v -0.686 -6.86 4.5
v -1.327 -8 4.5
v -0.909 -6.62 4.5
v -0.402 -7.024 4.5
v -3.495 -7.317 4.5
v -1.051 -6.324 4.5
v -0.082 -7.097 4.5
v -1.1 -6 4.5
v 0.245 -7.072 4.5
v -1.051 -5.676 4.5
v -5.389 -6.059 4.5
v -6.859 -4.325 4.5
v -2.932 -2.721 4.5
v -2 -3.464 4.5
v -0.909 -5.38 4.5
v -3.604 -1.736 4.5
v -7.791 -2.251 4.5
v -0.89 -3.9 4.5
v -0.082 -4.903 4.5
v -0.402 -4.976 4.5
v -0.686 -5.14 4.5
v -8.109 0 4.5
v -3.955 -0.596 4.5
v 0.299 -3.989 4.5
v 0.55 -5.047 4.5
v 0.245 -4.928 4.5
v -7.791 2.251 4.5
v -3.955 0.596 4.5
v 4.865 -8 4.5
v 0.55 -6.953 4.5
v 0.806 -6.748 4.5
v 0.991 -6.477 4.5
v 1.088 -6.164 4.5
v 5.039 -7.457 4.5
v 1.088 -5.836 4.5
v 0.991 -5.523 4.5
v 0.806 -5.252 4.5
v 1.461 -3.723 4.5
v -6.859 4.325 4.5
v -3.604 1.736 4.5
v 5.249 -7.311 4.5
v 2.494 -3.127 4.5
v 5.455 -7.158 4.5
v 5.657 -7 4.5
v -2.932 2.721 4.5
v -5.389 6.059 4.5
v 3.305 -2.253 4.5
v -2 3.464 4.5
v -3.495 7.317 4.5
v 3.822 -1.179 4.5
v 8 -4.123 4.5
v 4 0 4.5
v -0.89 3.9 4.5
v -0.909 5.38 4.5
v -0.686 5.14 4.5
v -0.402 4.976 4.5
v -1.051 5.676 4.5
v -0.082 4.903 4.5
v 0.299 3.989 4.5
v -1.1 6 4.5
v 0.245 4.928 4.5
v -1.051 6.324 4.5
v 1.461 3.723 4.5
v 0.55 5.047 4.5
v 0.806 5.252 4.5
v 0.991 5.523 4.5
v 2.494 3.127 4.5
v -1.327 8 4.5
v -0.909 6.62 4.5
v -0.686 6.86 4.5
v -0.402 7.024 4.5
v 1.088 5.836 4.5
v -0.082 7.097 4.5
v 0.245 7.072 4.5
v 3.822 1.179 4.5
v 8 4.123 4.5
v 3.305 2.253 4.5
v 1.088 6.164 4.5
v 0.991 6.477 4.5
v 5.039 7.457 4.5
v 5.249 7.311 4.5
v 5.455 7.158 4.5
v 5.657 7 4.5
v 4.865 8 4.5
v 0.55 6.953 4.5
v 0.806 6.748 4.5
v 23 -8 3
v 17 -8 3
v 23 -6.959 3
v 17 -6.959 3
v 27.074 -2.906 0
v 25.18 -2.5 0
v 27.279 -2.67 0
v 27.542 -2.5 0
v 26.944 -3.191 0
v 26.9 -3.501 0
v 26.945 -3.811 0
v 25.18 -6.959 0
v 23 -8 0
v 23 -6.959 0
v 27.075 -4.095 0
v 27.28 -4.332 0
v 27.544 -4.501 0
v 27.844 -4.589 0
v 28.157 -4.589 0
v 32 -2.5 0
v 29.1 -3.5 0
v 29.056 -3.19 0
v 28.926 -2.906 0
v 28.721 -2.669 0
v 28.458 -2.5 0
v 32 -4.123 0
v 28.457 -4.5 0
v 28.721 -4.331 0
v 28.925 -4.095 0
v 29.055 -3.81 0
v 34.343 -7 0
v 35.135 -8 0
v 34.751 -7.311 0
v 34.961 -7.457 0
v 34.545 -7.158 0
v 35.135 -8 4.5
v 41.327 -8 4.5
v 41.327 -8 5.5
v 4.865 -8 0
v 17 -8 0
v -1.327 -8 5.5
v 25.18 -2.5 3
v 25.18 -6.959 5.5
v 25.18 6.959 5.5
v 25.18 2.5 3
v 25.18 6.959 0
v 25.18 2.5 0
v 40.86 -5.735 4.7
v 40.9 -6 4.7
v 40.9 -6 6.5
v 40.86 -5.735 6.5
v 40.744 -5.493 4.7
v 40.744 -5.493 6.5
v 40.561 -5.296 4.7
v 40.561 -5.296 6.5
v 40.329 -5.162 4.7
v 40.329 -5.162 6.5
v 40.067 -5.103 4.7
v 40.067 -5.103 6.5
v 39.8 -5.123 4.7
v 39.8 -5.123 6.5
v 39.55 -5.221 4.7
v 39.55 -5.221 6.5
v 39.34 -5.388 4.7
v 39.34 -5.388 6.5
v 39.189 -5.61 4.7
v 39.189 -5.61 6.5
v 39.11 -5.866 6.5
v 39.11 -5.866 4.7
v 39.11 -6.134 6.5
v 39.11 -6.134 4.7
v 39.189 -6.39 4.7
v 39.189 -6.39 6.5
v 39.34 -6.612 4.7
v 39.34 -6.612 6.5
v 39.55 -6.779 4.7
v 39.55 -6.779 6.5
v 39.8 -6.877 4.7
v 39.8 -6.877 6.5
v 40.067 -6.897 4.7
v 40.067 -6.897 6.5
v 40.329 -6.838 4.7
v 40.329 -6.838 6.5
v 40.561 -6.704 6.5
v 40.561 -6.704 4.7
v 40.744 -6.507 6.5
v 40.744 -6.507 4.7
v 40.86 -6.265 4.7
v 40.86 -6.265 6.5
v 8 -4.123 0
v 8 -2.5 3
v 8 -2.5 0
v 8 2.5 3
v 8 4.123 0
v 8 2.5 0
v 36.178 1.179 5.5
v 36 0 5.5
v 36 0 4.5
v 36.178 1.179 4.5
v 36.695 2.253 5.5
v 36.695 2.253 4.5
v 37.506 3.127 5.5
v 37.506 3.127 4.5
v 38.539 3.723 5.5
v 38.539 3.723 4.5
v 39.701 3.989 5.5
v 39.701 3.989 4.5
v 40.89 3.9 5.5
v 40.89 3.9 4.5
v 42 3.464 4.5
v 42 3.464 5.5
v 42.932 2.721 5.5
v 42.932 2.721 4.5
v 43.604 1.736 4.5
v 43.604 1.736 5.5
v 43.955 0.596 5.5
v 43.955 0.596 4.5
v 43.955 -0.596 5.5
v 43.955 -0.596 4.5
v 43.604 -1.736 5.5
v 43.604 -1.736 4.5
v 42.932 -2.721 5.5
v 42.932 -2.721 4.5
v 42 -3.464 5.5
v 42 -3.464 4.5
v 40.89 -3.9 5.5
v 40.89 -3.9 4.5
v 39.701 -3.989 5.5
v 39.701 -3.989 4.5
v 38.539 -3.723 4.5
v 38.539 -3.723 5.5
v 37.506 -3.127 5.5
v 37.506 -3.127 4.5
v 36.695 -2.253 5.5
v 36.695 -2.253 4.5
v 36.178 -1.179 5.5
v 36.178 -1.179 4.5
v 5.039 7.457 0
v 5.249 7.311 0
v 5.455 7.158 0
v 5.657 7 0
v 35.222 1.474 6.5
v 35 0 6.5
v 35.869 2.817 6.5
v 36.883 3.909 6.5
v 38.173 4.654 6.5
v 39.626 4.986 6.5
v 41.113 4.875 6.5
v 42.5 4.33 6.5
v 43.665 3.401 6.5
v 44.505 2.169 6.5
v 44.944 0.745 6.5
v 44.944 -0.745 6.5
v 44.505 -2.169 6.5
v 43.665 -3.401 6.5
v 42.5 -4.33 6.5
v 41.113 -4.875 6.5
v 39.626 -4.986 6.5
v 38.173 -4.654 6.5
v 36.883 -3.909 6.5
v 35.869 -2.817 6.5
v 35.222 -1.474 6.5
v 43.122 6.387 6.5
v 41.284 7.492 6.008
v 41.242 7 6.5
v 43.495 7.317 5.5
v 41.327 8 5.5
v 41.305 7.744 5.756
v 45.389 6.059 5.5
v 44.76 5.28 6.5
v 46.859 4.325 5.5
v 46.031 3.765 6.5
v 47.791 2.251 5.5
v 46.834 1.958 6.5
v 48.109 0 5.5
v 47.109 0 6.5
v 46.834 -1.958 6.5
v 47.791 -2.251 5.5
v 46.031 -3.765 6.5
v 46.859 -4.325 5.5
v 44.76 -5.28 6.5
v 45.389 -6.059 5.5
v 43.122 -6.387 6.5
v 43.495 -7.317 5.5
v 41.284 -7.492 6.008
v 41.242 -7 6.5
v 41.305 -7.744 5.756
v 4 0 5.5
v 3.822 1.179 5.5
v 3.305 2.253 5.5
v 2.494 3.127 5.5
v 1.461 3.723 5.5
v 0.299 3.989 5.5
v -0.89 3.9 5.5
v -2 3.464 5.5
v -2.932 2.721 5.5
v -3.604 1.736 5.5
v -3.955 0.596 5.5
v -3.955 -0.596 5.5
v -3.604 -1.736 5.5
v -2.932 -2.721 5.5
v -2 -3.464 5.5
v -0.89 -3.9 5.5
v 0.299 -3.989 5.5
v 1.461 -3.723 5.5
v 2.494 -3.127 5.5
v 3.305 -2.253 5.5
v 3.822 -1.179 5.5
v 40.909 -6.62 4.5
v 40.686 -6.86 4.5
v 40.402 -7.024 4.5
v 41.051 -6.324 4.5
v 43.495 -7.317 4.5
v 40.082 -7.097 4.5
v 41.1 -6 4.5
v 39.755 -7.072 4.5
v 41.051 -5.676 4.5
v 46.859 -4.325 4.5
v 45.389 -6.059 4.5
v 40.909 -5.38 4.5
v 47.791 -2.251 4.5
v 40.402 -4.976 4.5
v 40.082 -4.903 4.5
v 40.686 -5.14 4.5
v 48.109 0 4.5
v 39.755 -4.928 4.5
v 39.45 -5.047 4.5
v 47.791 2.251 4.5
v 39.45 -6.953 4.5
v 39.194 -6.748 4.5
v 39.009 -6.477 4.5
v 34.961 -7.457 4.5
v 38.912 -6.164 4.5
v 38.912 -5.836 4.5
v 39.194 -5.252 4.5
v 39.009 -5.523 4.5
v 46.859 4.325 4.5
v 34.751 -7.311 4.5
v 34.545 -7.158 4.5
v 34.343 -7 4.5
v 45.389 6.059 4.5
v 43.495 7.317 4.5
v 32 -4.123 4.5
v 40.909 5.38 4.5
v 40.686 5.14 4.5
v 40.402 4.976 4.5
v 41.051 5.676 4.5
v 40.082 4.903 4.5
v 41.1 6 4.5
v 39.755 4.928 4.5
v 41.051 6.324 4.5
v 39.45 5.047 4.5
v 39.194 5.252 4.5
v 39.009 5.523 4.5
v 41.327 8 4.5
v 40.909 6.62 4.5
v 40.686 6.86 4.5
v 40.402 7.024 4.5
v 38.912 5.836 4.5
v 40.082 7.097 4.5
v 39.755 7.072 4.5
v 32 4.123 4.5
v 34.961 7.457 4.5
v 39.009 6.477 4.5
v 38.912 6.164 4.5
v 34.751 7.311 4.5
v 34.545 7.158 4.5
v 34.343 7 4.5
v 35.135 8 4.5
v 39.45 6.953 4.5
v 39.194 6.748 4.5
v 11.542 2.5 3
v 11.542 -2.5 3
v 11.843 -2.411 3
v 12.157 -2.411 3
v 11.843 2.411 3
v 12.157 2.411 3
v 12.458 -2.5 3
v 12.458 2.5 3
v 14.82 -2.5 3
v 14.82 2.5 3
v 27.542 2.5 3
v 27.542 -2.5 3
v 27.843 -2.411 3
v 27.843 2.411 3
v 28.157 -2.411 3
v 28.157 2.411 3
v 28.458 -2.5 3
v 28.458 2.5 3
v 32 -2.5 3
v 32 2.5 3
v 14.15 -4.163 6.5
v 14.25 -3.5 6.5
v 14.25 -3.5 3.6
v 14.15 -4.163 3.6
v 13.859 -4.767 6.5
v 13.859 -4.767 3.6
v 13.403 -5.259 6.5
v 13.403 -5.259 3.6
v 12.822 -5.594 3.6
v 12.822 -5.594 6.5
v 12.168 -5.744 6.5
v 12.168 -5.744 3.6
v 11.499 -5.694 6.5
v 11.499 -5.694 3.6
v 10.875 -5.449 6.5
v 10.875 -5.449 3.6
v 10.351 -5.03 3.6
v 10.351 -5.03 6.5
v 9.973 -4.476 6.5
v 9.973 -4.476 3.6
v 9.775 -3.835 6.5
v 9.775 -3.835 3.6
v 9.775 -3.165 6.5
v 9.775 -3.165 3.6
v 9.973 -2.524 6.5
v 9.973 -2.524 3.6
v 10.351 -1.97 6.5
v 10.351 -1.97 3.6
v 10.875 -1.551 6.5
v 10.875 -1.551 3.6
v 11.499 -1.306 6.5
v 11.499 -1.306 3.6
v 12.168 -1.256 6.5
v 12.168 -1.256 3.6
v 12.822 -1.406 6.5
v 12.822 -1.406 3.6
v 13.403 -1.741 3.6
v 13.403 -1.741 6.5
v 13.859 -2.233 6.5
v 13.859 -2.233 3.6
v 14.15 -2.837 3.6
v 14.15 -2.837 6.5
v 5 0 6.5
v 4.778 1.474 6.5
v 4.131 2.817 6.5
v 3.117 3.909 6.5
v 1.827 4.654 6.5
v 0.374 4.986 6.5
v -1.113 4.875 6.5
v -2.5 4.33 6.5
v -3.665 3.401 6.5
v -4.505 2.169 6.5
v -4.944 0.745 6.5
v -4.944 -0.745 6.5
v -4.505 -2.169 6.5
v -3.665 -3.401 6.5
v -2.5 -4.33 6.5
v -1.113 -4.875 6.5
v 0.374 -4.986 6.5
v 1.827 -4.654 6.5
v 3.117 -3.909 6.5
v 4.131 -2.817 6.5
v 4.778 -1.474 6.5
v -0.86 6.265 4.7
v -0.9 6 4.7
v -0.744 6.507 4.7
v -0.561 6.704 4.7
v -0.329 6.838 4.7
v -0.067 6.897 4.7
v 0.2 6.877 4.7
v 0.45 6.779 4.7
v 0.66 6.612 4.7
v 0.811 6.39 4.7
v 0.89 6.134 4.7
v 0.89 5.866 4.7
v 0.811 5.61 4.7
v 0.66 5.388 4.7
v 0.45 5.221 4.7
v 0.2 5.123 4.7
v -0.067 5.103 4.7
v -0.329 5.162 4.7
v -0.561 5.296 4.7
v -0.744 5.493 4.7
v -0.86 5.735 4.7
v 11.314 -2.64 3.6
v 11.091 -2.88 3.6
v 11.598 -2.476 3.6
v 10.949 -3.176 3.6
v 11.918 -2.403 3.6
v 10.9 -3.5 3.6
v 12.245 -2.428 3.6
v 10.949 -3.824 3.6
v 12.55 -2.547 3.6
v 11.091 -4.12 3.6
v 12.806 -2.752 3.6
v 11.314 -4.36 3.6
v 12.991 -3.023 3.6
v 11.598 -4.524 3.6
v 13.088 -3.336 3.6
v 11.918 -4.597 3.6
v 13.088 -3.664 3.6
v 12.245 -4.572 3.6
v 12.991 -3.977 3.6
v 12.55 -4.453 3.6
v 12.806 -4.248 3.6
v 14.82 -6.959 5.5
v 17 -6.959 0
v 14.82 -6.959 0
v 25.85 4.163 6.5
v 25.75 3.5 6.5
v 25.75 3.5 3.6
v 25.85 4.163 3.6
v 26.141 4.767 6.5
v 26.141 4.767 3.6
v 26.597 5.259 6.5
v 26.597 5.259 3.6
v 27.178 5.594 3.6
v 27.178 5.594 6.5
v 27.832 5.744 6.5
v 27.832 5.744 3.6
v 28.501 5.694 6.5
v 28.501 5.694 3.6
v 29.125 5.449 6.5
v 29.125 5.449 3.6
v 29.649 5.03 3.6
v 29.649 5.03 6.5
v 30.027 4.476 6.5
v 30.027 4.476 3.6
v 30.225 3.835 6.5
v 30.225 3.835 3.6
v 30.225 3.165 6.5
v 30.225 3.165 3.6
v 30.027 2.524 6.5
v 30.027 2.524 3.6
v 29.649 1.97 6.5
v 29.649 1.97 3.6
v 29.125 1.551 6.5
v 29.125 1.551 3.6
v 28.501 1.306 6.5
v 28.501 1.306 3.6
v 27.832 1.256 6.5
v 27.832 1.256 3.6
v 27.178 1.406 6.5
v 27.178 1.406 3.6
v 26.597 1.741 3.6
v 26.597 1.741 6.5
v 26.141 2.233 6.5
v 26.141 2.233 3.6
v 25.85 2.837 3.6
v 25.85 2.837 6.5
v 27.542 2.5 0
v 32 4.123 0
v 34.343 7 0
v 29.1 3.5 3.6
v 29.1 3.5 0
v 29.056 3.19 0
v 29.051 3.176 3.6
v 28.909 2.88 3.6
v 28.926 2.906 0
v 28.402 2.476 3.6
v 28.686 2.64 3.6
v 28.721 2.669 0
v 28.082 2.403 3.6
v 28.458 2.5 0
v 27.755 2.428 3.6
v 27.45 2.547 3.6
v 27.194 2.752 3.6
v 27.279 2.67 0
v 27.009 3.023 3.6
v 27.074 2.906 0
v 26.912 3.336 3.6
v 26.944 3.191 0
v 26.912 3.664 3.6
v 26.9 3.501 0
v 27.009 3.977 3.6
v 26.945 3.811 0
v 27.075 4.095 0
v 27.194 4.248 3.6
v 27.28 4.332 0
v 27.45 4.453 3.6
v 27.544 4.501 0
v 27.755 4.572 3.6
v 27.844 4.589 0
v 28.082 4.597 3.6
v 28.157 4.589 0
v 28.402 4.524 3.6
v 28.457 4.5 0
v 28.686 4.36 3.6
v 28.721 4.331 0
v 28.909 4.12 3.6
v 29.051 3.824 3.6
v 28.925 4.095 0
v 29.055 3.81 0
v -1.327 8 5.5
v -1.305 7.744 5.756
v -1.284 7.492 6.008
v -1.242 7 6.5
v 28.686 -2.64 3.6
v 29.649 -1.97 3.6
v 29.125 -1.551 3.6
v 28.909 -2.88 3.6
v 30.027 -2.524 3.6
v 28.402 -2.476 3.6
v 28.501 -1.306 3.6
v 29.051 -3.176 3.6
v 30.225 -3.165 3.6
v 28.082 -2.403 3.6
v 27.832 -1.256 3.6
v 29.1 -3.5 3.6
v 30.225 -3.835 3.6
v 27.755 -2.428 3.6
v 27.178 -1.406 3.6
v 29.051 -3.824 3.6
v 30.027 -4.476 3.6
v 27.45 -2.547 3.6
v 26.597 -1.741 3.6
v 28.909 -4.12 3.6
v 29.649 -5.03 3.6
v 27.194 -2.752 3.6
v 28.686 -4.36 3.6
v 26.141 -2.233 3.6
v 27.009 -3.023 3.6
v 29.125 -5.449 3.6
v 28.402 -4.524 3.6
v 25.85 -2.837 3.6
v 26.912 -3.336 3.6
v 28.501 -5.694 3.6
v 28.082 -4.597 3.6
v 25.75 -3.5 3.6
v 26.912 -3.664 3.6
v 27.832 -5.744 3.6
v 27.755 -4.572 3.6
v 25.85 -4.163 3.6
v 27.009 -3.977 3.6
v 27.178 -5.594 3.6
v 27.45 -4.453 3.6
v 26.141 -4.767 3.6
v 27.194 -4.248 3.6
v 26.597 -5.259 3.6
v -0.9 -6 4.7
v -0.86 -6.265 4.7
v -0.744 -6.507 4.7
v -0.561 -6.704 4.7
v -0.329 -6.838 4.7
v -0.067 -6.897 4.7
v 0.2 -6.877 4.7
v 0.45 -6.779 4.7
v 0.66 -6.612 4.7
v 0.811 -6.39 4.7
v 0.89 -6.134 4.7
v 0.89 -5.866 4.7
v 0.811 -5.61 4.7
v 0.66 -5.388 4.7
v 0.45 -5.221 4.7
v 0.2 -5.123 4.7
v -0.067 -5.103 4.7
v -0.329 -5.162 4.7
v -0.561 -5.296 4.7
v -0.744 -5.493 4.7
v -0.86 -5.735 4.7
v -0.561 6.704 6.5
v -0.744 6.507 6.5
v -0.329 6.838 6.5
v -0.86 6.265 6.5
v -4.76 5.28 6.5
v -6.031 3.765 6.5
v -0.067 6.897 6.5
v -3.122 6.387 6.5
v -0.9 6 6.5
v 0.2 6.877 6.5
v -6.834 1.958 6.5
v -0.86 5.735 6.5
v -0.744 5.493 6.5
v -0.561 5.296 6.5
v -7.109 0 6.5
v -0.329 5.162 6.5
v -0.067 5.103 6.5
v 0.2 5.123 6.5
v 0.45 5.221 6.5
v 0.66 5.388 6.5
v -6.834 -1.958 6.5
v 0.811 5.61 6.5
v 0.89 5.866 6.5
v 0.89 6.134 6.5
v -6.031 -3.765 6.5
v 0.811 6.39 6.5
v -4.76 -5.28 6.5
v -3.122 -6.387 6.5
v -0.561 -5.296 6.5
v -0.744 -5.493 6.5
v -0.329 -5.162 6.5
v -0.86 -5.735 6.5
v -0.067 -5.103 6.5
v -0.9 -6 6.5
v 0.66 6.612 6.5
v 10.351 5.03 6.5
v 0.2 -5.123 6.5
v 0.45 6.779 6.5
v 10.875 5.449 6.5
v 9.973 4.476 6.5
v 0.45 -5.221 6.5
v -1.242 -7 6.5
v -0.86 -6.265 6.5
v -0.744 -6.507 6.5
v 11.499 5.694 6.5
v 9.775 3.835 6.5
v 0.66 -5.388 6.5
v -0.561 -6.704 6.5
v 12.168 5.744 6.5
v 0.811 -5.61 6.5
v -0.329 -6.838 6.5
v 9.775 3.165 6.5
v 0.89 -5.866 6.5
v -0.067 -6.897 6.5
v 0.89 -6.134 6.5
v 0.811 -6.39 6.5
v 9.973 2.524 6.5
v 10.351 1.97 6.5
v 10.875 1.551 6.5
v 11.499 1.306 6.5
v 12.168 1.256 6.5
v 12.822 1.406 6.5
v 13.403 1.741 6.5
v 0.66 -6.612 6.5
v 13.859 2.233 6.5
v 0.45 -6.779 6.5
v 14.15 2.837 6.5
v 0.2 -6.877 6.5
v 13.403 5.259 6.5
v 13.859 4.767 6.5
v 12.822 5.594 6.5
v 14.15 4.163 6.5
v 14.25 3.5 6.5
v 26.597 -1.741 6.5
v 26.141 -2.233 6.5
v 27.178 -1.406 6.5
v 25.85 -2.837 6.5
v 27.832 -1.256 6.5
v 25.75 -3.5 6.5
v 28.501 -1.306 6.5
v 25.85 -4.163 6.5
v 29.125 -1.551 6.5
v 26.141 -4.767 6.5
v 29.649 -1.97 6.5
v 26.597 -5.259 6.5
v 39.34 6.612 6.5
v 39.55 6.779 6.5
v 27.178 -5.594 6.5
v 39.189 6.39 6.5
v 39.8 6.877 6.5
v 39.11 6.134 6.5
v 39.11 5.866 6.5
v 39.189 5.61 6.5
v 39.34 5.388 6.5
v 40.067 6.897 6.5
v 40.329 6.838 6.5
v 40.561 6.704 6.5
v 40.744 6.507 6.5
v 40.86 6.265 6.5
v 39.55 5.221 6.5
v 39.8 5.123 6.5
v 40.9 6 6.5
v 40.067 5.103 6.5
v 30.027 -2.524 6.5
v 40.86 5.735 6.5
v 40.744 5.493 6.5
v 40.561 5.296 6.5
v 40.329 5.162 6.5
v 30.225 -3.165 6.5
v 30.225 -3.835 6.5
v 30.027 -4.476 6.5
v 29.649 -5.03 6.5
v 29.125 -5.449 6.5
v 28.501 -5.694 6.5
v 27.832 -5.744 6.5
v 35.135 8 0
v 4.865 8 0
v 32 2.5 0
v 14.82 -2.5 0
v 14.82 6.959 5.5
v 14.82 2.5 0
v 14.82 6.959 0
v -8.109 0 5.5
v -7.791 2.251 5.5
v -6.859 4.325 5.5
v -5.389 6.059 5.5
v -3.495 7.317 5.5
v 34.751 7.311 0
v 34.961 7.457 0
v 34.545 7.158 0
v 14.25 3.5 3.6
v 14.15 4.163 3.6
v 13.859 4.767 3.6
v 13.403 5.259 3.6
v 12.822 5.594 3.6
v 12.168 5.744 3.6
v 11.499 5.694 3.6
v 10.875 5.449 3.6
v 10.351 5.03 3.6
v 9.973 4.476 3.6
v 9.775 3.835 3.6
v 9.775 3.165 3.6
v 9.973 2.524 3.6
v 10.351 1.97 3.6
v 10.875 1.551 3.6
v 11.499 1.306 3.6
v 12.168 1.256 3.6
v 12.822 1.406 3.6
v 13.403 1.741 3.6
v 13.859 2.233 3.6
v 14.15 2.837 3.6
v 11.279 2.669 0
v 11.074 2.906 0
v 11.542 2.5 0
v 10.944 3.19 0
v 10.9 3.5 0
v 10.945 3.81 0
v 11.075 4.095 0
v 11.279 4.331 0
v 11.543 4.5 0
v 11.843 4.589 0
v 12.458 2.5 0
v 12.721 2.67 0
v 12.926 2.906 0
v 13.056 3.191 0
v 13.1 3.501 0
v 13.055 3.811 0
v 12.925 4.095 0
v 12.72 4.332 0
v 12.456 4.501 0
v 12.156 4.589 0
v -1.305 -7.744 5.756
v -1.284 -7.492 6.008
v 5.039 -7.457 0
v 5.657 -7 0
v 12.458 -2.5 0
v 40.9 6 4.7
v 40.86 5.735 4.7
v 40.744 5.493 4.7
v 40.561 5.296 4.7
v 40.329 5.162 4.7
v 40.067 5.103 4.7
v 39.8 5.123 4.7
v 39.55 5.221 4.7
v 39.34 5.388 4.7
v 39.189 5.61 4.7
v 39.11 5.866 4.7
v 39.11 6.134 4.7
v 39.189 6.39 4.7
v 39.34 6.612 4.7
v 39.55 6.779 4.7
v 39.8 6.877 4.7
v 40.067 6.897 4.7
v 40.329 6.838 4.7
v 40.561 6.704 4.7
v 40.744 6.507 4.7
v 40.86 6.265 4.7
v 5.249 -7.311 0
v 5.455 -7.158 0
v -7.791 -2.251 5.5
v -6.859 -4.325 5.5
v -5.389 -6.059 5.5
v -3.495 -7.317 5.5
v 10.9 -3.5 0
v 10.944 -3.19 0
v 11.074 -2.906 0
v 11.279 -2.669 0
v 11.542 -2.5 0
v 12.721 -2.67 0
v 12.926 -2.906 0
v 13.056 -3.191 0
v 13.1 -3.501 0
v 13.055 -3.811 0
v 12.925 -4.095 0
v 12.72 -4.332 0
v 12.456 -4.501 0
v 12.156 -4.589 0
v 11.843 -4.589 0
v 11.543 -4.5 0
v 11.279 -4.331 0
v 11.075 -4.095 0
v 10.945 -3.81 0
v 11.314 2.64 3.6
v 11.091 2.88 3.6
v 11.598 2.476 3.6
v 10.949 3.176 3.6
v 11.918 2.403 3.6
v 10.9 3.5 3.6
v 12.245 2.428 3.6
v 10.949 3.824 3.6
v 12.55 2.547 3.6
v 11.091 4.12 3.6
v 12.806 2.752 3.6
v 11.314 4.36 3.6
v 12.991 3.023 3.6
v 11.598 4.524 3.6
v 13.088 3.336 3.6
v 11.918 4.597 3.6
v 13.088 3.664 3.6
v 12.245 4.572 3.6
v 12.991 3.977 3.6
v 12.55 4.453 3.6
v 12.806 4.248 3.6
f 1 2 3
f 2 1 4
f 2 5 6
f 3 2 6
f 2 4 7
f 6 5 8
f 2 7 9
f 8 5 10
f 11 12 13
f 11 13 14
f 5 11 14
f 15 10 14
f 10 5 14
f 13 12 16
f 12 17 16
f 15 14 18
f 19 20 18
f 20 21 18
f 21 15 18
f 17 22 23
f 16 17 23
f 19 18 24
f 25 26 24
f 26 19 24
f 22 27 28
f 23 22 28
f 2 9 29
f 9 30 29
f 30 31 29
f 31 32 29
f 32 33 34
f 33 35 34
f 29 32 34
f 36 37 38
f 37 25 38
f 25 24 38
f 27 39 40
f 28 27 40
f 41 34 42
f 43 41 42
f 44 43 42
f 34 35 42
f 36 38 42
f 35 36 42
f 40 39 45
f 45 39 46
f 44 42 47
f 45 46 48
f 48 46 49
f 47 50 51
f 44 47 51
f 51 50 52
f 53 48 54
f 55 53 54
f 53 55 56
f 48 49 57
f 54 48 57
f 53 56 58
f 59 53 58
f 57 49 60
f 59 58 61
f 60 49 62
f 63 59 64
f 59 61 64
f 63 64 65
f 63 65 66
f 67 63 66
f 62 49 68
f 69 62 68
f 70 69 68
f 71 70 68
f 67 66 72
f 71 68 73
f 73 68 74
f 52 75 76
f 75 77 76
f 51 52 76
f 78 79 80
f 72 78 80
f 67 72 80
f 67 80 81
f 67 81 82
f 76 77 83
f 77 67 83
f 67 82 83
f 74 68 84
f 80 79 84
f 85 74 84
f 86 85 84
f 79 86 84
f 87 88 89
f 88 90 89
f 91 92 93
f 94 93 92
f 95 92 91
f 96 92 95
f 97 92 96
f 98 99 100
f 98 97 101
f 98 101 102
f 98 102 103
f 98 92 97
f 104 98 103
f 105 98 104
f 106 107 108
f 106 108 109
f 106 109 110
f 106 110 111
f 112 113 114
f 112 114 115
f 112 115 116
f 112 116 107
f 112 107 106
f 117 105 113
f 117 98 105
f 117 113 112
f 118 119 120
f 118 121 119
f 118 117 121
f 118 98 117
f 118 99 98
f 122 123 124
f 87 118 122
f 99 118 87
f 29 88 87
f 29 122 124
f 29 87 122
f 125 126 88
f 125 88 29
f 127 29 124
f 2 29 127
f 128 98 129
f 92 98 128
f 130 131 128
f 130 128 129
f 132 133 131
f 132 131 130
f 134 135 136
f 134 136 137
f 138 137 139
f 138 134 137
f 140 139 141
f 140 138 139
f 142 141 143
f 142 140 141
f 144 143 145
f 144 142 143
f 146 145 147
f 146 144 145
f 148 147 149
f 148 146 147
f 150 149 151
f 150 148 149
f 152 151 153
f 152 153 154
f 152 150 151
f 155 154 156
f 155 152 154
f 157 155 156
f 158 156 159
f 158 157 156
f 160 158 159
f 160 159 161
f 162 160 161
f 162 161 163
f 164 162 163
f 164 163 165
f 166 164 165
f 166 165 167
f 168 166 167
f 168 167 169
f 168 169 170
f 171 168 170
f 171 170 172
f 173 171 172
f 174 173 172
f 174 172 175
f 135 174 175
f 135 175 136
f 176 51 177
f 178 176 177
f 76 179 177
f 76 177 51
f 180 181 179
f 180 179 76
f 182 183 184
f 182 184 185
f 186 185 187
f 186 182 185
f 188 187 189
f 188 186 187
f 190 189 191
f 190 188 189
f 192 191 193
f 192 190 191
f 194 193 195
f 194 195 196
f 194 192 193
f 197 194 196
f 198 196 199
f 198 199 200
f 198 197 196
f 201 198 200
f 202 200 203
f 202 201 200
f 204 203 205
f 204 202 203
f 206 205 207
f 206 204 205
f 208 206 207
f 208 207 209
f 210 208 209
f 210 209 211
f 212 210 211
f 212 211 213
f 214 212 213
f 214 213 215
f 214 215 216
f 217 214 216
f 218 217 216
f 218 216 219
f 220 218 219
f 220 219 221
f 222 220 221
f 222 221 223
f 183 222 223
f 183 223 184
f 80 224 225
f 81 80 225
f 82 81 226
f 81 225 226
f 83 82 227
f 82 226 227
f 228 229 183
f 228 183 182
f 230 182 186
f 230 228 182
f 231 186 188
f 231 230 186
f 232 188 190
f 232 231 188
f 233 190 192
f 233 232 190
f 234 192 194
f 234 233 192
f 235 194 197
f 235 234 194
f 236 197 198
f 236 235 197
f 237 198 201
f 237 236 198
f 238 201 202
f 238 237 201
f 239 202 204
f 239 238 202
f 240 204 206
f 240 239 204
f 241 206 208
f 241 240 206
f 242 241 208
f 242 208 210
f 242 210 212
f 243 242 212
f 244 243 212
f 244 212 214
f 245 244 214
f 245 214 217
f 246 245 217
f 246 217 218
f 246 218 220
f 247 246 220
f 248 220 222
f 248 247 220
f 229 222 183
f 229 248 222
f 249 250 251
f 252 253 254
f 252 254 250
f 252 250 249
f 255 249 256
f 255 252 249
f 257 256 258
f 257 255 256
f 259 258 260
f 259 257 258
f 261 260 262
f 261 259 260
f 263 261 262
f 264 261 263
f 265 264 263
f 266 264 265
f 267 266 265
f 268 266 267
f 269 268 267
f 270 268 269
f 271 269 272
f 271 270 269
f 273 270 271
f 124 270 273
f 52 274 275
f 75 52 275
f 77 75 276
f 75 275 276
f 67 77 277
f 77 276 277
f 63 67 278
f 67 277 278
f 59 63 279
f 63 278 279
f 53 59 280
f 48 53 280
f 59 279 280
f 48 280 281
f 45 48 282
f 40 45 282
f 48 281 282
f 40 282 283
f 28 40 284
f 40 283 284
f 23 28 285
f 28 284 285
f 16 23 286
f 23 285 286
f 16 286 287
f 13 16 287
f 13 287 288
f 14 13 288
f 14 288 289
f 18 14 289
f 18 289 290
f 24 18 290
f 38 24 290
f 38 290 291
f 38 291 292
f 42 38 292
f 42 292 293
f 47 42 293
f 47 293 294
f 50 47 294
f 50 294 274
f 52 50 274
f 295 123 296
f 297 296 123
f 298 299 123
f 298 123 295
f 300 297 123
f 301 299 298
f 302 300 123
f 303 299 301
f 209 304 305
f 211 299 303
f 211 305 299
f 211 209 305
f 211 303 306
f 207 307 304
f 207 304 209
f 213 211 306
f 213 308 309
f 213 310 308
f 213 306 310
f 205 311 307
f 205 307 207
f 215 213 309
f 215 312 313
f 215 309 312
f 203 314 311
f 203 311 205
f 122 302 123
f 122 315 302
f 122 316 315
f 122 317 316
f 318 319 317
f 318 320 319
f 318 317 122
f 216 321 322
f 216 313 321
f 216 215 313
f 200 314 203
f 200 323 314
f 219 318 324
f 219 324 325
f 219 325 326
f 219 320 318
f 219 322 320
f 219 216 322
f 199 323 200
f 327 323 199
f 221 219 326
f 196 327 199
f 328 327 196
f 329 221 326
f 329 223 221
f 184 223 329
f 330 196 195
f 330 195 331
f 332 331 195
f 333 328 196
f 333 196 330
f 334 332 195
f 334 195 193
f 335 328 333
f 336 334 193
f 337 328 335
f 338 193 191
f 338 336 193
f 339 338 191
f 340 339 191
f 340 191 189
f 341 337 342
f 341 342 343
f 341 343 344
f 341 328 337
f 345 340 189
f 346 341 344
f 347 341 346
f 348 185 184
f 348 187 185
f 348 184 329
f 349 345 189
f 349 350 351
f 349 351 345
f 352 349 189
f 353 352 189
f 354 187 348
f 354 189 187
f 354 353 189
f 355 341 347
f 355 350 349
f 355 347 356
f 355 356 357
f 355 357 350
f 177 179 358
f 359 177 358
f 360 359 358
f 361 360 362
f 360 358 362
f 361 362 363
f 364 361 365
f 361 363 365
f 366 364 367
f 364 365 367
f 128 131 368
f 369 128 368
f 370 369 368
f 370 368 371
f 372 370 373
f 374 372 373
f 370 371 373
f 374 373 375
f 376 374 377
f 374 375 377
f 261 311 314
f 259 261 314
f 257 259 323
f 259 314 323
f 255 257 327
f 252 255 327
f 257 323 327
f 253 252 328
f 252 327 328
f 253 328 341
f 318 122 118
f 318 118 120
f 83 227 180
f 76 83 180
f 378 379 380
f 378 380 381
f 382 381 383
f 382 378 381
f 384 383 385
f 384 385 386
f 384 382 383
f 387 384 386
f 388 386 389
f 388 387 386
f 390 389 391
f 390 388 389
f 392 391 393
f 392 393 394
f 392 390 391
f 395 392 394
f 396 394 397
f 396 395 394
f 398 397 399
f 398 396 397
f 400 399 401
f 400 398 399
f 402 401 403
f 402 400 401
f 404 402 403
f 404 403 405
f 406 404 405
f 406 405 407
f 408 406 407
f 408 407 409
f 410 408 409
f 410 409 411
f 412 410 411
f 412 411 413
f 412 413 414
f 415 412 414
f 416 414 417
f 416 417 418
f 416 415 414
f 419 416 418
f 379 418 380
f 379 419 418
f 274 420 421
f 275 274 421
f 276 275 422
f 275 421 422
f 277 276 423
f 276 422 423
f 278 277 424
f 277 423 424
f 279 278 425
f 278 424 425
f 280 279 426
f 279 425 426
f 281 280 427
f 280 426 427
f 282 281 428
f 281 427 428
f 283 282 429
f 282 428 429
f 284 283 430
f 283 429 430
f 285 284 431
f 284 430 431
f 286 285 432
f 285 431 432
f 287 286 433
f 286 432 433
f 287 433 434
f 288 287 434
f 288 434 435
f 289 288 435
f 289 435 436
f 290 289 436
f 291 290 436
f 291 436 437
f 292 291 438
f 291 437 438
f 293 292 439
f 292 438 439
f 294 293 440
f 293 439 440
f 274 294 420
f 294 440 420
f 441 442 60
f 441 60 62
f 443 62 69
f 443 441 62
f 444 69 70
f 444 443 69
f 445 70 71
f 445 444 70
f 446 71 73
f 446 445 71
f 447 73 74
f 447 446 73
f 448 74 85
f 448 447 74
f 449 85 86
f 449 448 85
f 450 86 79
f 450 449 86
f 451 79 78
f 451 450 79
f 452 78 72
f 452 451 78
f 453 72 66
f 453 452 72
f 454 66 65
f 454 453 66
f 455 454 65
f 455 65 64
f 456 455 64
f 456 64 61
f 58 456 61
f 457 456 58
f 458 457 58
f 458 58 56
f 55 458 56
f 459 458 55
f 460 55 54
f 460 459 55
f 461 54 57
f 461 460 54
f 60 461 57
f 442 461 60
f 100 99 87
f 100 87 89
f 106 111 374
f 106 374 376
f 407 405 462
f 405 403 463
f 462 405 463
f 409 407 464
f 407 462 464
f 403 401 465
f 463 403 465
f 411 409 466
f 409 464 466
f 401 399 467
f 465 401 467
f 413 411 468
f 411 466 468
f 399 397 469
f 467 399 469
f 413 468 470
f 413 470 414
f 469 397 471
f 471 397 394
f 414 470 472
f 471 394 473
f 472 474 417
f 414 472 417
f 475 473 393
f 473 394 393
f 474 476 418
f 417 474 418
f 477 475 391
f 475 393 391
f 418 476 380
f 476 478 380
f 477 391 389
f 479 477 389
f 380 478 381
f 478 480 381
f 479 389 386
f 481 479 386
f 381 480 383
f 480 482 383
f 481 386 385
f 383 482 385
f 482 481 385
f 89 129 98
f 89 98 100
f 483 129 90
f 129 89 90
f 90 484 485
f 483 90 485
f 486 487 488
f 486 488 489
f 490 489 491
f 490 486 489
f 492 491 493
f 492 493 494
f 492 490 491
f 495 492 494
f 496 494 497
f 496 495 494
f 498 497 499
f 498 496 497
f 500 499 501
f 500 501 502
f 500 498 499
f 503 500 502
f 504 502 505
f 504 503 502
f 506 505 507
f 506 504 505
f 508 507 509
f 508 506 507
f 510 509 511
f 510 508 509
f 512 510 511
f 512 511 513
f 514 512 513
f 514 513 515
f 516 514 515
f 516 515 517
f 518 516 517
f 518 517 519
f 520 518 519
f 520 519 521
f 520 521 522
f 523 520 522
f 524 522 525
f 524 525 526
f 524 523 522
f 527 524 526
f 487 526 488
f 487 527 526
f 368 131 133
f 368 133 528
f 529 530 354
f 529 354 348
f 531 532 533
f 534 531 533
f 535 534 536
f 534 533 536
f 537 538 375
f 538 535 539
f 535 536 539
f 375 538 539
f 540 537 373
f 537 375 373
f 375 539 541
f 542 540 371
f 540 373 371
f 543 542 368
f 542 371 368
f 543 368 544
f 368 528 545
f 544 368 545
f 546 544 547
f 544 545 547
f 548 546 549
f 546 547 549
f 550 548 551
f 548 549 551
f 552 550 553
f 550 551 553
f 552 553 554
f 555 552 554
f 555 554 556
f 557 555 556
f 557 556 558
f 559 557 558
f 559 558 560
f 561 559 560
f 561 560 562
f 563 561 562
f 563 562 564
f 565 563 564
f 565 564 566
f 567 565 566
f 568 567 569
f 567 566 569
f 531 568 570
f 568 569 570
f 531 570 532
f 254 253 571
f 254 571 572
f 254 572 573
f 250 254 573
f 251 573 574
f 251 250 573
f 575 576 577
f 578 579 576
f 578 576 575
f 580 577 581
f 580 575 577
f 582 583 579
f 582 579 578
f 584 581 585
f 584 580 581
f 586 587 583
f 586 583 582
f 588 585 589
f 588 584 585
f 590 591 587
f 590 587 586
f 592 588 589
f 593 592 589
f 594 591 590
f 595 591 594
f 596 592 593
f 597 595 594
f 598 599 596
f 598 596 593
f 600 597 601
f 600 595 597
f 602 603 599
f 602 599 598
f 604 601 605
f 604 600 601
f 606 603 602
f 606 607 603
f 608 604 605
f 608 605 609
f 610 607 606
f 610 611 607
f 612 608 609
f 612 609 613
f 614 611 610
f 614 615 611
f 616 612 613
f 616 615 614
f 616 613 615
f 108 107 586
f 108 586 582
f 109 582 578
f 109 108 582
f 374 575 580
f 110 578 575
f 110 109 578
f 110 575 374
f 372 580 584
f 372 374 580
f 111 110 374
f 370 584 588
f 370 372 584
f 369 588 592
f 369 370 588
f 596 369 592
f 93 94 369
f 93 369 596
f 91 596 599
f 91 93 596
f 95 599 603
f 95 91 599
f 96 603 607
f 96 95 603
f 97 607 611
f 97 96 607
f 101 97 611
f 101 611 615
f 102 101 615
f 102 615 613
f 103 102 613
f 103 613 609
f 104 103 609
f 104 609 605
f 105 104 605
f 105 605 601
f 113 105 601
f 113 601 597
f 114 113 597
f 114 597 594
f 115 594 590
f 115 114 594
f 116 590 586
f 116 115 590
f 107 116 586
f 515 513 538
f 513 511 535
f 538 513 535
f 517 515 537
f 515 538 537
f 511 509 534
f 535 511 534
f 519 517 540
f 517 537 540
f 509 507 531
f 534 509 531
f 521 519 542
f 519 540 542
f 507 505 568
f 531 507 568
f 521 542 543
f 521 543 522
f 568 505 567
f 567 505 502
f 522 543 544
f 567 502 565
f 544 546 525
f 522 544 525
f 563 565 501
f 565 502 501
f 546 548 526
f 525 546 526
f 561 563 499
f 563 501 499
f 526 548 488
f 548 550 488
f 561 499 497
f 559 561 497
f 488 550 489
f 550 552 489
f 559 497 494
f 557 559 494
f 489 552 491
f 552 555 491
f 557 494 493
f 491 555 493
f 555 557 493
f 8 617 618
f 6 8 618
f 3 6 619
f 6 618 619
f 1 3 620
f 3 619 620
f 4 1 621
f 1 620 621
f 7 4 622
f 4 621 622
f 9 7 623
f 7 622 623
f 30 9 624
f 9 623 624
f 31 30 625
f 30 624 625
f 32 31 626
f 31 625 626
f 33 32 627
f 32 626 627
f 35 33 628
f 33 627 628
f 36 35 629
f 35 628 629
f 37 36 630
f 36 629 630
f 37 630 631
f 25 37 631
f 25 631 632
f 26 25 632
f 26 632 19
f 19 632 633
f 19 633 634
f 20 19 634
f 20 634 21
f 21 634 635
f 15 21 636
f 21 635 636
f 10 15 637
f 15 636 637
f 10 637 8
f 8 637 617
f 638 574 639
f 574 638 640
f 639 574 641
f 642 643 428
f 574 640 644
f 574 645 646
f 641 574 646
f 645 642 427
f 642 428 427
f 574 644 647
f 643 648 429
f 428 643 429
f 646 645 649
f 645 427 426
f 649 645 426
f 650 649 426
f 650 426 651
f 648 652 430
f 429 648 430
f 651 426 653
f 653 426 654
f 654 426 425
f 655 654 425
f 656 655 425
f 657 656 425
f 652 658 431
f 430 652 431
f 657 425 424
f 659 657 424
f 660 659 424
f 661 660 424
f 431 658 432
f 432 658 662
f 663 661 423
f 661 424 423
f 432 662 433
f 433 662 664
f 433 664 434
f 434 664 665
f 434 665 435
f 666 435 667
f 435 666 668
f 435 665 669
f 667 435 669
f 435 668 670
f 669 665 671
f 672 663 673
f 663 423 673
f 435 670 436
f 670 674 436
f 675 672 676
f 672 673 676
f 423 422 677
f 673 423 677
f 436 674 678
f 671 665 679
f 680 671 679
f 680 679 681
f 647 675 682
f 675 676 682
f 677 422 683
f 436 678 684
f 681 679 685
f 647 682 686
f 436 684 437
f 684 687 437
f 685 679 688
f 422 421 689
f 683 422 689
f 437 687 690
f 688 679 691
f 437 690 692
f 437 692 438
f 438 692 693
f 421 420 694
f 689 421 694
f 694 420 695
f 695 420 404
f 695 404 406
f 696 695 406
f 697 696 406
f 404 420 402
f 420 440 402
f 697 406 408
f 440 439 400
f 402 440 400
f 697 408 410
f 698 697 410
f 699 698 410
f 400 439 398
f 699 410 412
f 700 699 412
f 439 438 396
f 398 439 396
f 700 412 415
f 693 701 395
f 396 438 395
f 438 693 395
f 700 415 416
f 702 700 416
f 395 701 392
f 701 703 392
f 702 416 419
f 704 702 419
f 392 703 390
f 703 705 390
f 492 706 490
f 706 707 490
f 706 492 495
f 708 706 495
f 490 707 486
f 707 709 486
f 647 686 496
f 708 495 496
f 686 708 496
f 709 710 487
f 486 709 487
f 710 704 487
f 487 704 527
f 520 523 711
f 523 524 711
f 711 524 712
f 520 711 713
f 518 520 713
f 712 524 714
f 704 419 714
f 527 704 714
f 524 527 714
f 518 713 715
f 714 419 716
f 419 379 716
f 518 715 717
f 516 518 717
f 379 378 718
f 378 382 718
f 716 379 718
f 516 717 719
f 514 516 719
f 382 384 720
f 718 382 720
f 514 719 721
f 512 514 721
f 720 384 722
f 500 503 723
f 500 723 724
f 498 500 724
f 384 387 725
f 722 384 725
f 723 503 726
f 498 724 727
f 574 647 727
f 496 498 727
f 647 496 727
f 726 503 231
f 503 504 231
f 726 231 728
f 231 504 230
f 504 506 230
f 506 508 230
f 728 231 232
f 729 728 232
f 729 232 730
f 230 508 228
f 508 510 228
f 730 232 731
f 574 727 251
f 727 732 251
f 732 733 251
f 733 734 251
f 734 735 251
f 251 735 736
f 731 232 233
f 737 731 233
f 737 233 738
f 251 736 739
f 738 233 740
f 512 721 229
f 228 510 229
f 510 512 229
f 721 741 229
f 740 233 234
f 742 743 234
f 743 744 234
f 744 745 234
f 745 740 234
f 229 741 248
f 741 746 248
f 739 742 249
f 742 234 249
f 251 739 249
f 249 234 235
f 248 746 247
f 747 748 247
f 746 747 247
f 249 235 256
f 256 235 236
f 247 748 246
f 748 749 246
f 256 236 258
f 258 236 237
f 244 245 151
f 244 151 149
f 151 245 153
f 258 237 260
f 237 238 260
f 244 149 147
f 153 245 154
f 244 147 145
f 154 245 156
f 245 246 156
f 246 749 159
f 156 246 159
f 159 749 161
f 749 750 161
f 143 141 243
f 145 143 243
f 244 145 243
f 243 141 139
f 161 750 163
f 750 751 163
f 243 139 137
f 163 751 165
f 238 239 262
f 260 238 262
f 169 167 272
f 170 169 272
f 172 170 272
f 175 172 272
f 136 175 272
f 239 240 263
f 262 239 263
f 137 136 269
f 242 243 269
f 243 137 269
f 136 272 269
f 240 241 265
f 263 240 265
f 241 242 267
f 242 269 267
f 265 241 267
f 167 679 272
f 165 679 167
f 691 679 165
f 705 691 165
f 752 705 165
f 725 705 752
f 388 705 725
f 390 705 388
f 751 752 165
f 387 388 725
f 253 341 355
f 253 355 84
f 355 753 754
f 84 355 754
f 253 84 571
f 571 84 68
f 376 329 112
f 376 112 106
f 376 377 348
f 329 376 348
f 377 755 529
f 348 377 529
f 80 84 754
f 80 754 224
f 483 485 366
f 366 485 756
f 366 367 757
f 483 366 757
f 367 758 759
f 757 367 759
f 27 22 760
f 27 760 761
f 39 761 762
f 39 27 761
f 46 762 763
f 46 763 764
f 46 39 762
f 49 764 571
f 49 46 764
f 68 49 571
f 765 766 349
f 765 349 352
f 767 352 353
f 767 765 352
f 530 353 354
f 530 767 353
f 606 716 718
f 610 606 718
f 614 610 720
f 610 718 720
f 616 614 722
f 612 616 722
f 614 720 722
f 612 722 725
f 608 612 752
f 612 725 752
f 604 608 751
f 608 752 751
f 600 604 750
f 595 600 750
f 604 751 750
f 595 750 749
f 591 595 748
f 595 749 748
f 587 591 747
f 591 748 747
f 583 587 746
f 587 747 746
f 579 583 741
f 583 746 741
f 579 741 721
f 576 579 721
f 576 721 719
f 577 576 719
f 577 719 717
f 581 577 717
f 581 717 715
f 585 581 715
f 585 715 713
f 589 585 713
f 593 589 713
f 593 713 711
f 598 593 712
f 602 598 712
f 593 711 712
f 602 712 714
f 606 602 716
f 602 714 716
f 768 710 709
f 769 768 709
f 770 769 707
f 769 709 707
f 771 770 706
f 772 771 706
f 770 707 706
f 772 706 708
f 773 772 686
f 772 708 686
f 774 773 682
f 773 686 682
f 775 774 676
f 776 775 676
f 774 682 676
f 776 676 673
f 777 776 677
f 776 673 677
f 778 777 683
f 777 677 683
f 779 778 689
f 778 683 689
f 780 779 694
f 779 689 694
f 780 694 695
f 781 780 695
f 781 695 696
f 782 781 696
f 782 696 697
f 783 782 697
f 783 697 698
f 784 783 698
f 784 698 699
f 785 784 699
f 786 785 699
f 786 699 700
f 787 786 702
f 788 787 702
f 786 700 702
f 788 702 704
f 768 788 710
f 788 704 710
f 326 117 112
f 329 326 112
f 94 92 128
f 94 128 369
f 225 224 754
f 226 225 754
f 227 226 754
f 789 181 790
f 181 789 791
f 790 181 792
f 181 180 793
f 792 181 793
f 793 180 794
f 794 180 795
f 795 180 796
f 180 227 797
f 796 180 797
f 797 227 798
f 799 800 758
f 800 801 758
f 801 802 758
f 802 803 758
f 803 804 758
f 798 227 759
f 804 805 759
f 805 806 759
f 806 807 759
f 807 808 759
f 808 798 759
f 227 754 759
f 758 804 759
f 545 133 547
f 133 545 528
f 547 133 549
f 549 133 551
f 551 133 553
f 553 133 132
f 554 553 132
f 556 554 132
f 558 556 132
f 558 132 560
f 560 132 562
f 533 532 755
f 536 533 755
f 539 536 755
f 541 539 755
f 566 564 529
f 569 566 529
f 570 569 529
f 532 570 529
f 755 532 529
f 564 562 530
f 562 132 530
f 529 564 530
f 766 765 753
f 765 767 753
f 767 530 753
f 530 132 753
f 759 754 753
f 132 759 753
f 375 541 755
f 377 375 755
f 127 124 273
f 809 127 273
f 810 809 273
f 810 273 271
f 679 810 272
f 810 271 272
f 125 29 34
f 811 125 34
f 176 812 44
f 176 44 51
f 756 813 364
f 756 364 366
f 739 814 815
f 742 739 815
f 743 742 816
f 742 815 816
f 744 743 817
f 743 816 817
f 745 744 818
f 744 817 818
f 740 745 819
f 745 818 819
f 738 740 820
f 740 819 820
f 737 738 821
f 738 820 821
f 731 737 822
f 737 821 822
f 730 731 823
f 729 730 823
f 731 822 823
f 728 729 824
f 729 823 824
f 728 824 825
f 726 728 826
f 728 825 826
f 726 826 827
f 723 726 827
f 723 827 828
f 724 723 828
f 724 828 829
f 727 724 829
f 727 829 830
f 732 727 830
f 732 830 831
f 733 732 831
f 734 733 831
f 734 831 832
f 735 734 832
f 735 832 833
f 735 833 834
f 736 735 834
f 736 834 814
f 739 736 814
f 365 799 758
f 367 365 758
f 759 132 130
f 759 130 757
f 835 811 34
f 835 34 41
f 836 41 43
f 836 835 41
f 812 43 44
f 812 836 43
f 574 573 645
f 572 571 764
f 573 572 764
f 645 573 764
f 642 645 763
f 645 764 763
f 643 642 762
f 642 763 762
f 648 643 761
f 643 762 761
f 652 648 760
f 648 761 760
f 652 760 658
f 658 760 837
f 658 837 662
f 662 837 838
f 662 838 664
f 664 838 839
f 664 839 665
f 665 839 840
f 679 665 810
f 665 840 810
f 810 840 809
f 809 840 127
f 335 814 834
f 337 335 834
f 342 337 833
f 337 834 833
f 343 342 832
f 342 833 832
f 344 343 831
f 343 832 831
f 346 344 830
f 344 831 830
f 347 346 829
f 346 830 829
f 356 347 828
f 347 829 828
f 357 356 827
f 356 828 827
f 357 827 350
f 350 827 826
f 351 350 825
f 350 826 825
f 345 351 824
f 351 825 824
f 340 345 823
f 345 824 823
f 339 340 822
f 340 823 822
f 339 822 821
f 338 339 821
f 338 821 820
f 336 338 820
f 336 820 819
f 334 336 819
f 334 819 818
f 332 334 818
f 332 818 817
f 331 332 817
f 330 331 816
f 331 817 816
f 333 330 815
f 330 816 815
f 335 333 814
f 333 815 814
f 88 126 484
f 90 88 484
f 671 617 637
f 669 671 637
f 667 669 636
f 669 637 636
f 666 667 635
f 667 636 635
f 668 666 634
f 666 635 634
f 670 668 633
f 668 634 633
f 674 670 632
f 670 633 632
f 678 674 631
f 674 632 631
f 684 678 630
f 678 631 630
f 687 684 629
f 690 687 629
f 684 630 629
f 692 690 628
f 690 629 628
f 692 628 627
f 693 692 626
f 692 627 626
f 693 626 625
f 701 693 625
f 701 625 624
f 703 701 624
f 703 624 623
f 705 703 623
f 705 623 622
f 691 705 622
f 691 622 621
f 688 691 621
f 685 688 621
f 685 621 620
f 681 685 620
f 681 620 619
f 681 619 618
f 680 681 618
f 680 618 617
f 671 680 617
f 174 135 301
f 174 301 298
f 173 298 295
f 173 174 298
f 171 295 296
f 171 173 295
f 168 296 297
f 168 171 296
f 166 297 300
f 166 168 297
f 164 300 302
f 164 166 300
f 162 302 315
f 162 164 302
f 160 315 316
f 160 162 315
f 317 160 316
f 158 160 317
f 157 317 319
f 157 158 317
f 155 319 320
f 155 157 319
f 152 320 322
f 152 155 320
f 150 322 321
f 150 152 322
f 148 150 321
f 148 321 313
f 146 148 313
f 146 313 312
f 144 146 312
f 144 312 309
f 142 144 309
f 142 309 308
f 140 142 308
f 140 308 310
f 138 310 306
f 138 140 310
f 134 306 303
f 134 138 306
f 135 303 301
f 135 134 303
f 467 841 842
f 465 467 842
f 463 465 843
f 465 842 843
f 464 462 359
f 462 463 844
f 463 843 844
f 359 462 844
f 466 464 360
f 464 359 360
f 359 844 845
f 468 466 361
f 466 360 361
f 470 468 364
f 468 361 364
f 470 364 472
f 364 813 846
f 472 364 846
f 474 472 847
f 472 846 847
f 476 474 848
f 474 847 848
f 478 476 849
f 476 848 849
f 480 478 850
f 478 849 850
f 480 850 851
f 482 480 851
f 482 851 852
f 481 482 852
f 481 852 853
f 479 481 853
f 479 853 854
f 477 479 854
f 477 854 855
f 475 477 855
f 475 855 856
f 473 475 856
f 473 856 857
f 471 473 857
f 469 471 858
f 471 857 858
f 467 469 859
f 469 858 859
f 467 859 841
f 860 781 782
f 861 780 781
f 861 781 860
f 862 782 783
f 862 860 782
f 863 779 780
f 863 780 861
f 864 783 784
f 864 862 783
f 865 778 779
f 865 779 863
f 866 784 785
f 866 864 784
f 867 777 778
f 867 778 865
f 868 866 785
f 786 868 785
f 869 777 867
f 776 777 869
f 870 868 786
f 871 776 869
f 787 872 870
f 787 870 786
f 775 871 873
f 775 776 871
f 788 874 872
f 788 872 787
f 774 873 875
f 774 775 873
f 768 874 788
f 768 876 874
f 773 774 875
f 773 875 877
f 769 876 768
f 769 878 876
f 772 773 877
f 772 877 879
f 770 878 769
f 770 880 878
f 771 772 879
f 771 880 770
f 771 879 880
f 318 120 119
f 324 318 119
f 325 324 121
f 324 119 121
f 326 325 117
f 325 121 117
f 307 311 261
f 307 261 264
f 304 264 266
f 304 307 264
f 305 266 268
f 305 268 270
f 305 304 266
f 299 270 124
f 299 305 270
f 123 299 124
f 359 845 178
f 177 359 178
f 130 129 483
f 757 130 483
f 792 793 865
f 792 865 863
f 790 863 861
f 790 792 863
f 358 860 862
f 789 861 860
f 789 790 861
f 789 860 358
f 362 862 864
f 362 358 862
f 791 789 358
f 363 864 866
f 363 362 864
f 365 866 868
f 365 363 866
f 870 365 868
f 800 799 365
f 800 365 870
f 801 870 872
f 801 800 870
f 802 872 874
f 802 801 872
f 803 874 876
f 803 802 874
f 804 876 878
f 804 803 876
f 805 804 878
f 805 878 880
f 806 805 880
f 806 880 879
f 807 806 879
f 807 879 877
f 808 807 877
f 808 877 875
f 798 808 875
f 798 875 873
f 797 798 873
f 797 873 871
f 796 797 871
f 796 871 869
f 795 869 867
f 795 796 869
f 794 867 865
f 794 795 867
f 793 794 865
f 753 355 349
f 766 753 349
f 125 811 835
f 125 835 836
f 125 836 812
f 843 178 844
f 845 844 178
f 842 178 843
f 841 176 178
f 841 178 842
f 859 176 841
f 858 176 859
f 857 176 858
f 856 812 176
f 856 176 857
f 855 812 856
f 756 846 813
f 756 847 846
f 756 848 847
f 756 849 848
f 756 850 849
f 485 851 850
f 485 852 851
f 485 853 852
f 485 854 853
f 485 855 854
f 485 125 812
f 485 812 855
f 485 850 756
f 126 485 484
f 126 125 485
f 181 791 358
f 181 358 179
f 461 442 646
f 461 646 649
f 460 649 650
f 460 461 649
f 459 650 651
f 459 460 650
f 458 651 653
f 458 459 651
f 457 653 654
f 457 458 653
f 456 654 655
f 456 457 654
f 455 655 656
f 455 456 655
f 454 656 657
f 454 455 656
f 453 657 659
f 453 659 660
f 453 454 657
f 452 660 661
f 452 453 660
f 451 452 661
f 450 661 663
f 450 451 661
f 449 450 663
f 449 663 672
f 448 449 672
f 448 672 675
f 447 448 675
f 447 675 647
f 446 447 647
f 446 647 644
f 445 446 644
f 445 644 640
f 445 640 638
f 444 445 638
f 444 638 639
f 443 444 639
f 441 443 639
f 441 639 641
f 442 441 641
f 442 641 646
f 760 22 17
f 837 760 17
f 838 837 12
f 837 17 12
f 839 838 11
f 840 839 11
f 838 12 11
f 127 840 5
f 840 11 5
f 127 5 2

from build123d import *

# Parameters (mm, degrees)
CROQUIS1_R              = 0.9
CROQUIS1_R_2            = 1.1
SALIENTE_EXTRUIR1_DEPTH = 6.5
CORTAR_EXTRUIR6_DEPTH   = 4.5
CHAFL_N1_SIZE           = 1
CHAFL_N1_SIZE_2         = 0.742384029
CROQUIS5_W              = 12
CROQUIS5_H              = 2.5
CORTAR_EXTRUIR7_DEPTH   = 3
CROQUIS6_R              = 2.25
CORTAR_EXTRUIR8_DEPTH   = 2.9
CHAFL_N3_SIZE           = 0.2
CROQUIS7_R              = 4
CORTAR_EXTRUIR9_DEPTH   = 23.5
CHAFL_N2_SIZE           = 1
CORTAR_EXTRUIR2_START   = -6.5
CROQUIS3_W              = 6
CROQUIS3_H              = 17.049295702
CORTAR_EXTRUIR2_DEPTH   = 3
CROQUIS8_W              = 10.359823846
CROQUIS8_H              = 13.918607014
CORTAR_EXTRUIR10_DEPTH  = 5.5


with BuildPart() as part:
    # Croquis1 → Saliente-Extruir1 (new body)
    with BuildSketch(Plane.XY):
        with BuildLine():
            Line((-1.326649916, 8), (20, 8))
            Line((20, 8), (20, 0))
            Line((20, 0), (8, 0))
            Line((8, 0), (-8.109253973, 0))
            ThreePointArc((-8.109253973, 0), (-6.185391706, 5.24413286), (-1.326649916, 8))
        make_face()
        with Locations(Location((0, 6, 0), (0, 0, 180))):
            Circle(CROQUIS1_R, mode=Mode.SUBTRACT)
        with Locations(Location((12, 3.5, 0), (0, 0, 180))):
            Circle(CROQUIS1_R_2, mode=Mode.SUBTRACT)
    extrude(amount=SALIENTE_EXTRUIR1_DEPTH)

    # Croquis4 → Cortar-Extruir6 (cut)
    with BuildSketch(Plane(origin=(0, 0, 0), x_dir=(-1, 0, 0), z_dir=(0, 0, -1))):
        with BuildLine():
            Line((-5.656854249, 7), (-8, 4.123105626))
            Line((-8, 4.123105626), (-8, 0))
            Line((-8, 0), (8.109253973, 0))
            Line((8.109253973, 0), (9, 0))
            ThreePointArc((9, 0), (3.878679656, 8.121320344), (-5.656854249, 7))
        make_face()
    extrude(amount=-CORTAR_EXTRUIR6_DEPTH, mode=Mode.SUBTRACT)

    # Chaflán1
    # the kernel refuses this chamfer: 1, 0.742384029 mm, written as the material it takes off along each edge
    with BuildSketch(Plane(origin=(-5.698510996, 8, 6.5), x_dir=(0, 0, -1), z_dir=(1, 0, 0))) as chafl_n1_piece_1:
        Polygon((CHAFL_N1_SIZE, 0), (0, -CHAFL_N1_SIZE), (0, 0), align=None)
    extrude(amount=28.270193984, mode=Mode.SUBTRACT)
    with BuildSketch(Plane(origin=(4.123105626, 8, 4.5), x_dir=(1, 0, 0), z_dir=(0, 0, -1))) as chafl_n1_piece_2:
        with BuildLine():
            Line((CHAFL_N1_SIZE_2, 0), (0.916025454, 0.542979283))
            ThreePointArc((0.916025454, 0.542979283), (0.478949419, 0.265590562), (0, 0))
            Line((0, 0), (CHAFL_N1_SIZE_2, 0))
        make_face()
    extrude(amount=7.23772815, mode=Mode.SUBTRACT)
    with BuildSketch(Plane(origin=(0, 0, 6.5), x_dir=(-0.9501026430594787, -0.31193744188762096, 0), z_dir=(0.31193744188762096, -0.9501026430594787, 0))) as chafl_n1_piece_3:
        Polygon((8.109253973 - CHAFL_N1_SIZE, 0), (8.109253973, CHAFL_N1_SIZE), (8.109253973, 0), align=None)
    revolve(axis=Axis((0, 0, 6.5), (0, 0, -1)), revolution_arc=116.936314038, mode=Mode.SUBTRACT)

    # Croquis5 → Cortar-Extruir7 (cut)
    with BuildSketch(Plane(origin=(0, 0, 0), x_dir=(-1, 0, 0), z_dir=(0, 0, -1))):
        with Locations((-14, 1.25)):
            Rectangle(CROQUIS5_W, CROQUIS5_H)
    extrude(amount=-CORTAR_EXTRUIR7_DEPTH, mode=Mode.SUBTRACT)

    # Croquis6 → Cortar-Extruir8 (cut)
    with BuildSketch(Plane.XY.offset(6.5)):
        with Locations((12, 3.5)):
            Circle(CROQUIS6_R)
    extrude(amount=-CORTAR_EXTRUIR8_DEPTH, mode=Mode.SUBTRACT)

    # Chaflán3
    chafl_n3_edges = [part.edges().sort_by_distance(p)[0] for p in [
        (0.9, 6, 4.5),
    ]]
    chamfer(chafl_n3_edges, length=CHAFL_N3_SIZE)

    # Simetría1: part across plane


with BuildPart() as part_1:
    add(part.part)
    add(part.part.mirror(Plane(origin=(20, 0, 6.5), x_dir=(0, 0, 1), z_dir=(0, 1, 0))))

    # Croquis7 → Cortar-Extruir9 (cut, through all)
    with BuildSketch(Plane.XY.offset(6.5)):
        Circle(CROQUIS7_R)
    extrude(amount=-CORTAR_EXTRUIR9_DEPTH, mode=Mode.SUBTRACT)

    # Chaflán2
    chafl_n2_edges = [part_1.edges().sort_by_distance(p)[0] for p in [
        (-4, 0, 6.5),
    ]]
    chamfer(chafl_n2_edges, length=CHAFL_N2_SIZE)

    # Simetría2: part across plane


with BuildPart() as part_2:
    add(part_1.part)
    add(part_1.part.mirror(Plane(origin=(20, 8, 6.5), x_dir=(0, 0, 1), z_dir=(-1, 0, 0))))

    # Croquis3 → Cortar-Extruir2 (cut)
    with BuildSketch(Plane.XY.offset(6.5).offset(CORTAR_EXTRUIR2_START)):
        with Locations((20, -8)):
            Rectangle(CROQUIS3_W, CROQUIS3_H)
    extrude(amount=CORTAR_EXTRUIR2_DEPTH, mode=Mode.SUBTRACT)

    # Croquis8 → Cortar-Extruir10 (cut)
    with BuildSketch(Plane(origin=(0, 0, 0), x_dir=(-1, 0, 0), z_dir=(0, 0, -1))):
        with Locations((-20, 0)):
            Rectangle(CROQUIS8_W, CROQUIS8_H)
    extrude(amount=-CORTAR_EXTRUIR10_DEPTH, mode=Mode.SUBTRACT)


solid = part_2.part
